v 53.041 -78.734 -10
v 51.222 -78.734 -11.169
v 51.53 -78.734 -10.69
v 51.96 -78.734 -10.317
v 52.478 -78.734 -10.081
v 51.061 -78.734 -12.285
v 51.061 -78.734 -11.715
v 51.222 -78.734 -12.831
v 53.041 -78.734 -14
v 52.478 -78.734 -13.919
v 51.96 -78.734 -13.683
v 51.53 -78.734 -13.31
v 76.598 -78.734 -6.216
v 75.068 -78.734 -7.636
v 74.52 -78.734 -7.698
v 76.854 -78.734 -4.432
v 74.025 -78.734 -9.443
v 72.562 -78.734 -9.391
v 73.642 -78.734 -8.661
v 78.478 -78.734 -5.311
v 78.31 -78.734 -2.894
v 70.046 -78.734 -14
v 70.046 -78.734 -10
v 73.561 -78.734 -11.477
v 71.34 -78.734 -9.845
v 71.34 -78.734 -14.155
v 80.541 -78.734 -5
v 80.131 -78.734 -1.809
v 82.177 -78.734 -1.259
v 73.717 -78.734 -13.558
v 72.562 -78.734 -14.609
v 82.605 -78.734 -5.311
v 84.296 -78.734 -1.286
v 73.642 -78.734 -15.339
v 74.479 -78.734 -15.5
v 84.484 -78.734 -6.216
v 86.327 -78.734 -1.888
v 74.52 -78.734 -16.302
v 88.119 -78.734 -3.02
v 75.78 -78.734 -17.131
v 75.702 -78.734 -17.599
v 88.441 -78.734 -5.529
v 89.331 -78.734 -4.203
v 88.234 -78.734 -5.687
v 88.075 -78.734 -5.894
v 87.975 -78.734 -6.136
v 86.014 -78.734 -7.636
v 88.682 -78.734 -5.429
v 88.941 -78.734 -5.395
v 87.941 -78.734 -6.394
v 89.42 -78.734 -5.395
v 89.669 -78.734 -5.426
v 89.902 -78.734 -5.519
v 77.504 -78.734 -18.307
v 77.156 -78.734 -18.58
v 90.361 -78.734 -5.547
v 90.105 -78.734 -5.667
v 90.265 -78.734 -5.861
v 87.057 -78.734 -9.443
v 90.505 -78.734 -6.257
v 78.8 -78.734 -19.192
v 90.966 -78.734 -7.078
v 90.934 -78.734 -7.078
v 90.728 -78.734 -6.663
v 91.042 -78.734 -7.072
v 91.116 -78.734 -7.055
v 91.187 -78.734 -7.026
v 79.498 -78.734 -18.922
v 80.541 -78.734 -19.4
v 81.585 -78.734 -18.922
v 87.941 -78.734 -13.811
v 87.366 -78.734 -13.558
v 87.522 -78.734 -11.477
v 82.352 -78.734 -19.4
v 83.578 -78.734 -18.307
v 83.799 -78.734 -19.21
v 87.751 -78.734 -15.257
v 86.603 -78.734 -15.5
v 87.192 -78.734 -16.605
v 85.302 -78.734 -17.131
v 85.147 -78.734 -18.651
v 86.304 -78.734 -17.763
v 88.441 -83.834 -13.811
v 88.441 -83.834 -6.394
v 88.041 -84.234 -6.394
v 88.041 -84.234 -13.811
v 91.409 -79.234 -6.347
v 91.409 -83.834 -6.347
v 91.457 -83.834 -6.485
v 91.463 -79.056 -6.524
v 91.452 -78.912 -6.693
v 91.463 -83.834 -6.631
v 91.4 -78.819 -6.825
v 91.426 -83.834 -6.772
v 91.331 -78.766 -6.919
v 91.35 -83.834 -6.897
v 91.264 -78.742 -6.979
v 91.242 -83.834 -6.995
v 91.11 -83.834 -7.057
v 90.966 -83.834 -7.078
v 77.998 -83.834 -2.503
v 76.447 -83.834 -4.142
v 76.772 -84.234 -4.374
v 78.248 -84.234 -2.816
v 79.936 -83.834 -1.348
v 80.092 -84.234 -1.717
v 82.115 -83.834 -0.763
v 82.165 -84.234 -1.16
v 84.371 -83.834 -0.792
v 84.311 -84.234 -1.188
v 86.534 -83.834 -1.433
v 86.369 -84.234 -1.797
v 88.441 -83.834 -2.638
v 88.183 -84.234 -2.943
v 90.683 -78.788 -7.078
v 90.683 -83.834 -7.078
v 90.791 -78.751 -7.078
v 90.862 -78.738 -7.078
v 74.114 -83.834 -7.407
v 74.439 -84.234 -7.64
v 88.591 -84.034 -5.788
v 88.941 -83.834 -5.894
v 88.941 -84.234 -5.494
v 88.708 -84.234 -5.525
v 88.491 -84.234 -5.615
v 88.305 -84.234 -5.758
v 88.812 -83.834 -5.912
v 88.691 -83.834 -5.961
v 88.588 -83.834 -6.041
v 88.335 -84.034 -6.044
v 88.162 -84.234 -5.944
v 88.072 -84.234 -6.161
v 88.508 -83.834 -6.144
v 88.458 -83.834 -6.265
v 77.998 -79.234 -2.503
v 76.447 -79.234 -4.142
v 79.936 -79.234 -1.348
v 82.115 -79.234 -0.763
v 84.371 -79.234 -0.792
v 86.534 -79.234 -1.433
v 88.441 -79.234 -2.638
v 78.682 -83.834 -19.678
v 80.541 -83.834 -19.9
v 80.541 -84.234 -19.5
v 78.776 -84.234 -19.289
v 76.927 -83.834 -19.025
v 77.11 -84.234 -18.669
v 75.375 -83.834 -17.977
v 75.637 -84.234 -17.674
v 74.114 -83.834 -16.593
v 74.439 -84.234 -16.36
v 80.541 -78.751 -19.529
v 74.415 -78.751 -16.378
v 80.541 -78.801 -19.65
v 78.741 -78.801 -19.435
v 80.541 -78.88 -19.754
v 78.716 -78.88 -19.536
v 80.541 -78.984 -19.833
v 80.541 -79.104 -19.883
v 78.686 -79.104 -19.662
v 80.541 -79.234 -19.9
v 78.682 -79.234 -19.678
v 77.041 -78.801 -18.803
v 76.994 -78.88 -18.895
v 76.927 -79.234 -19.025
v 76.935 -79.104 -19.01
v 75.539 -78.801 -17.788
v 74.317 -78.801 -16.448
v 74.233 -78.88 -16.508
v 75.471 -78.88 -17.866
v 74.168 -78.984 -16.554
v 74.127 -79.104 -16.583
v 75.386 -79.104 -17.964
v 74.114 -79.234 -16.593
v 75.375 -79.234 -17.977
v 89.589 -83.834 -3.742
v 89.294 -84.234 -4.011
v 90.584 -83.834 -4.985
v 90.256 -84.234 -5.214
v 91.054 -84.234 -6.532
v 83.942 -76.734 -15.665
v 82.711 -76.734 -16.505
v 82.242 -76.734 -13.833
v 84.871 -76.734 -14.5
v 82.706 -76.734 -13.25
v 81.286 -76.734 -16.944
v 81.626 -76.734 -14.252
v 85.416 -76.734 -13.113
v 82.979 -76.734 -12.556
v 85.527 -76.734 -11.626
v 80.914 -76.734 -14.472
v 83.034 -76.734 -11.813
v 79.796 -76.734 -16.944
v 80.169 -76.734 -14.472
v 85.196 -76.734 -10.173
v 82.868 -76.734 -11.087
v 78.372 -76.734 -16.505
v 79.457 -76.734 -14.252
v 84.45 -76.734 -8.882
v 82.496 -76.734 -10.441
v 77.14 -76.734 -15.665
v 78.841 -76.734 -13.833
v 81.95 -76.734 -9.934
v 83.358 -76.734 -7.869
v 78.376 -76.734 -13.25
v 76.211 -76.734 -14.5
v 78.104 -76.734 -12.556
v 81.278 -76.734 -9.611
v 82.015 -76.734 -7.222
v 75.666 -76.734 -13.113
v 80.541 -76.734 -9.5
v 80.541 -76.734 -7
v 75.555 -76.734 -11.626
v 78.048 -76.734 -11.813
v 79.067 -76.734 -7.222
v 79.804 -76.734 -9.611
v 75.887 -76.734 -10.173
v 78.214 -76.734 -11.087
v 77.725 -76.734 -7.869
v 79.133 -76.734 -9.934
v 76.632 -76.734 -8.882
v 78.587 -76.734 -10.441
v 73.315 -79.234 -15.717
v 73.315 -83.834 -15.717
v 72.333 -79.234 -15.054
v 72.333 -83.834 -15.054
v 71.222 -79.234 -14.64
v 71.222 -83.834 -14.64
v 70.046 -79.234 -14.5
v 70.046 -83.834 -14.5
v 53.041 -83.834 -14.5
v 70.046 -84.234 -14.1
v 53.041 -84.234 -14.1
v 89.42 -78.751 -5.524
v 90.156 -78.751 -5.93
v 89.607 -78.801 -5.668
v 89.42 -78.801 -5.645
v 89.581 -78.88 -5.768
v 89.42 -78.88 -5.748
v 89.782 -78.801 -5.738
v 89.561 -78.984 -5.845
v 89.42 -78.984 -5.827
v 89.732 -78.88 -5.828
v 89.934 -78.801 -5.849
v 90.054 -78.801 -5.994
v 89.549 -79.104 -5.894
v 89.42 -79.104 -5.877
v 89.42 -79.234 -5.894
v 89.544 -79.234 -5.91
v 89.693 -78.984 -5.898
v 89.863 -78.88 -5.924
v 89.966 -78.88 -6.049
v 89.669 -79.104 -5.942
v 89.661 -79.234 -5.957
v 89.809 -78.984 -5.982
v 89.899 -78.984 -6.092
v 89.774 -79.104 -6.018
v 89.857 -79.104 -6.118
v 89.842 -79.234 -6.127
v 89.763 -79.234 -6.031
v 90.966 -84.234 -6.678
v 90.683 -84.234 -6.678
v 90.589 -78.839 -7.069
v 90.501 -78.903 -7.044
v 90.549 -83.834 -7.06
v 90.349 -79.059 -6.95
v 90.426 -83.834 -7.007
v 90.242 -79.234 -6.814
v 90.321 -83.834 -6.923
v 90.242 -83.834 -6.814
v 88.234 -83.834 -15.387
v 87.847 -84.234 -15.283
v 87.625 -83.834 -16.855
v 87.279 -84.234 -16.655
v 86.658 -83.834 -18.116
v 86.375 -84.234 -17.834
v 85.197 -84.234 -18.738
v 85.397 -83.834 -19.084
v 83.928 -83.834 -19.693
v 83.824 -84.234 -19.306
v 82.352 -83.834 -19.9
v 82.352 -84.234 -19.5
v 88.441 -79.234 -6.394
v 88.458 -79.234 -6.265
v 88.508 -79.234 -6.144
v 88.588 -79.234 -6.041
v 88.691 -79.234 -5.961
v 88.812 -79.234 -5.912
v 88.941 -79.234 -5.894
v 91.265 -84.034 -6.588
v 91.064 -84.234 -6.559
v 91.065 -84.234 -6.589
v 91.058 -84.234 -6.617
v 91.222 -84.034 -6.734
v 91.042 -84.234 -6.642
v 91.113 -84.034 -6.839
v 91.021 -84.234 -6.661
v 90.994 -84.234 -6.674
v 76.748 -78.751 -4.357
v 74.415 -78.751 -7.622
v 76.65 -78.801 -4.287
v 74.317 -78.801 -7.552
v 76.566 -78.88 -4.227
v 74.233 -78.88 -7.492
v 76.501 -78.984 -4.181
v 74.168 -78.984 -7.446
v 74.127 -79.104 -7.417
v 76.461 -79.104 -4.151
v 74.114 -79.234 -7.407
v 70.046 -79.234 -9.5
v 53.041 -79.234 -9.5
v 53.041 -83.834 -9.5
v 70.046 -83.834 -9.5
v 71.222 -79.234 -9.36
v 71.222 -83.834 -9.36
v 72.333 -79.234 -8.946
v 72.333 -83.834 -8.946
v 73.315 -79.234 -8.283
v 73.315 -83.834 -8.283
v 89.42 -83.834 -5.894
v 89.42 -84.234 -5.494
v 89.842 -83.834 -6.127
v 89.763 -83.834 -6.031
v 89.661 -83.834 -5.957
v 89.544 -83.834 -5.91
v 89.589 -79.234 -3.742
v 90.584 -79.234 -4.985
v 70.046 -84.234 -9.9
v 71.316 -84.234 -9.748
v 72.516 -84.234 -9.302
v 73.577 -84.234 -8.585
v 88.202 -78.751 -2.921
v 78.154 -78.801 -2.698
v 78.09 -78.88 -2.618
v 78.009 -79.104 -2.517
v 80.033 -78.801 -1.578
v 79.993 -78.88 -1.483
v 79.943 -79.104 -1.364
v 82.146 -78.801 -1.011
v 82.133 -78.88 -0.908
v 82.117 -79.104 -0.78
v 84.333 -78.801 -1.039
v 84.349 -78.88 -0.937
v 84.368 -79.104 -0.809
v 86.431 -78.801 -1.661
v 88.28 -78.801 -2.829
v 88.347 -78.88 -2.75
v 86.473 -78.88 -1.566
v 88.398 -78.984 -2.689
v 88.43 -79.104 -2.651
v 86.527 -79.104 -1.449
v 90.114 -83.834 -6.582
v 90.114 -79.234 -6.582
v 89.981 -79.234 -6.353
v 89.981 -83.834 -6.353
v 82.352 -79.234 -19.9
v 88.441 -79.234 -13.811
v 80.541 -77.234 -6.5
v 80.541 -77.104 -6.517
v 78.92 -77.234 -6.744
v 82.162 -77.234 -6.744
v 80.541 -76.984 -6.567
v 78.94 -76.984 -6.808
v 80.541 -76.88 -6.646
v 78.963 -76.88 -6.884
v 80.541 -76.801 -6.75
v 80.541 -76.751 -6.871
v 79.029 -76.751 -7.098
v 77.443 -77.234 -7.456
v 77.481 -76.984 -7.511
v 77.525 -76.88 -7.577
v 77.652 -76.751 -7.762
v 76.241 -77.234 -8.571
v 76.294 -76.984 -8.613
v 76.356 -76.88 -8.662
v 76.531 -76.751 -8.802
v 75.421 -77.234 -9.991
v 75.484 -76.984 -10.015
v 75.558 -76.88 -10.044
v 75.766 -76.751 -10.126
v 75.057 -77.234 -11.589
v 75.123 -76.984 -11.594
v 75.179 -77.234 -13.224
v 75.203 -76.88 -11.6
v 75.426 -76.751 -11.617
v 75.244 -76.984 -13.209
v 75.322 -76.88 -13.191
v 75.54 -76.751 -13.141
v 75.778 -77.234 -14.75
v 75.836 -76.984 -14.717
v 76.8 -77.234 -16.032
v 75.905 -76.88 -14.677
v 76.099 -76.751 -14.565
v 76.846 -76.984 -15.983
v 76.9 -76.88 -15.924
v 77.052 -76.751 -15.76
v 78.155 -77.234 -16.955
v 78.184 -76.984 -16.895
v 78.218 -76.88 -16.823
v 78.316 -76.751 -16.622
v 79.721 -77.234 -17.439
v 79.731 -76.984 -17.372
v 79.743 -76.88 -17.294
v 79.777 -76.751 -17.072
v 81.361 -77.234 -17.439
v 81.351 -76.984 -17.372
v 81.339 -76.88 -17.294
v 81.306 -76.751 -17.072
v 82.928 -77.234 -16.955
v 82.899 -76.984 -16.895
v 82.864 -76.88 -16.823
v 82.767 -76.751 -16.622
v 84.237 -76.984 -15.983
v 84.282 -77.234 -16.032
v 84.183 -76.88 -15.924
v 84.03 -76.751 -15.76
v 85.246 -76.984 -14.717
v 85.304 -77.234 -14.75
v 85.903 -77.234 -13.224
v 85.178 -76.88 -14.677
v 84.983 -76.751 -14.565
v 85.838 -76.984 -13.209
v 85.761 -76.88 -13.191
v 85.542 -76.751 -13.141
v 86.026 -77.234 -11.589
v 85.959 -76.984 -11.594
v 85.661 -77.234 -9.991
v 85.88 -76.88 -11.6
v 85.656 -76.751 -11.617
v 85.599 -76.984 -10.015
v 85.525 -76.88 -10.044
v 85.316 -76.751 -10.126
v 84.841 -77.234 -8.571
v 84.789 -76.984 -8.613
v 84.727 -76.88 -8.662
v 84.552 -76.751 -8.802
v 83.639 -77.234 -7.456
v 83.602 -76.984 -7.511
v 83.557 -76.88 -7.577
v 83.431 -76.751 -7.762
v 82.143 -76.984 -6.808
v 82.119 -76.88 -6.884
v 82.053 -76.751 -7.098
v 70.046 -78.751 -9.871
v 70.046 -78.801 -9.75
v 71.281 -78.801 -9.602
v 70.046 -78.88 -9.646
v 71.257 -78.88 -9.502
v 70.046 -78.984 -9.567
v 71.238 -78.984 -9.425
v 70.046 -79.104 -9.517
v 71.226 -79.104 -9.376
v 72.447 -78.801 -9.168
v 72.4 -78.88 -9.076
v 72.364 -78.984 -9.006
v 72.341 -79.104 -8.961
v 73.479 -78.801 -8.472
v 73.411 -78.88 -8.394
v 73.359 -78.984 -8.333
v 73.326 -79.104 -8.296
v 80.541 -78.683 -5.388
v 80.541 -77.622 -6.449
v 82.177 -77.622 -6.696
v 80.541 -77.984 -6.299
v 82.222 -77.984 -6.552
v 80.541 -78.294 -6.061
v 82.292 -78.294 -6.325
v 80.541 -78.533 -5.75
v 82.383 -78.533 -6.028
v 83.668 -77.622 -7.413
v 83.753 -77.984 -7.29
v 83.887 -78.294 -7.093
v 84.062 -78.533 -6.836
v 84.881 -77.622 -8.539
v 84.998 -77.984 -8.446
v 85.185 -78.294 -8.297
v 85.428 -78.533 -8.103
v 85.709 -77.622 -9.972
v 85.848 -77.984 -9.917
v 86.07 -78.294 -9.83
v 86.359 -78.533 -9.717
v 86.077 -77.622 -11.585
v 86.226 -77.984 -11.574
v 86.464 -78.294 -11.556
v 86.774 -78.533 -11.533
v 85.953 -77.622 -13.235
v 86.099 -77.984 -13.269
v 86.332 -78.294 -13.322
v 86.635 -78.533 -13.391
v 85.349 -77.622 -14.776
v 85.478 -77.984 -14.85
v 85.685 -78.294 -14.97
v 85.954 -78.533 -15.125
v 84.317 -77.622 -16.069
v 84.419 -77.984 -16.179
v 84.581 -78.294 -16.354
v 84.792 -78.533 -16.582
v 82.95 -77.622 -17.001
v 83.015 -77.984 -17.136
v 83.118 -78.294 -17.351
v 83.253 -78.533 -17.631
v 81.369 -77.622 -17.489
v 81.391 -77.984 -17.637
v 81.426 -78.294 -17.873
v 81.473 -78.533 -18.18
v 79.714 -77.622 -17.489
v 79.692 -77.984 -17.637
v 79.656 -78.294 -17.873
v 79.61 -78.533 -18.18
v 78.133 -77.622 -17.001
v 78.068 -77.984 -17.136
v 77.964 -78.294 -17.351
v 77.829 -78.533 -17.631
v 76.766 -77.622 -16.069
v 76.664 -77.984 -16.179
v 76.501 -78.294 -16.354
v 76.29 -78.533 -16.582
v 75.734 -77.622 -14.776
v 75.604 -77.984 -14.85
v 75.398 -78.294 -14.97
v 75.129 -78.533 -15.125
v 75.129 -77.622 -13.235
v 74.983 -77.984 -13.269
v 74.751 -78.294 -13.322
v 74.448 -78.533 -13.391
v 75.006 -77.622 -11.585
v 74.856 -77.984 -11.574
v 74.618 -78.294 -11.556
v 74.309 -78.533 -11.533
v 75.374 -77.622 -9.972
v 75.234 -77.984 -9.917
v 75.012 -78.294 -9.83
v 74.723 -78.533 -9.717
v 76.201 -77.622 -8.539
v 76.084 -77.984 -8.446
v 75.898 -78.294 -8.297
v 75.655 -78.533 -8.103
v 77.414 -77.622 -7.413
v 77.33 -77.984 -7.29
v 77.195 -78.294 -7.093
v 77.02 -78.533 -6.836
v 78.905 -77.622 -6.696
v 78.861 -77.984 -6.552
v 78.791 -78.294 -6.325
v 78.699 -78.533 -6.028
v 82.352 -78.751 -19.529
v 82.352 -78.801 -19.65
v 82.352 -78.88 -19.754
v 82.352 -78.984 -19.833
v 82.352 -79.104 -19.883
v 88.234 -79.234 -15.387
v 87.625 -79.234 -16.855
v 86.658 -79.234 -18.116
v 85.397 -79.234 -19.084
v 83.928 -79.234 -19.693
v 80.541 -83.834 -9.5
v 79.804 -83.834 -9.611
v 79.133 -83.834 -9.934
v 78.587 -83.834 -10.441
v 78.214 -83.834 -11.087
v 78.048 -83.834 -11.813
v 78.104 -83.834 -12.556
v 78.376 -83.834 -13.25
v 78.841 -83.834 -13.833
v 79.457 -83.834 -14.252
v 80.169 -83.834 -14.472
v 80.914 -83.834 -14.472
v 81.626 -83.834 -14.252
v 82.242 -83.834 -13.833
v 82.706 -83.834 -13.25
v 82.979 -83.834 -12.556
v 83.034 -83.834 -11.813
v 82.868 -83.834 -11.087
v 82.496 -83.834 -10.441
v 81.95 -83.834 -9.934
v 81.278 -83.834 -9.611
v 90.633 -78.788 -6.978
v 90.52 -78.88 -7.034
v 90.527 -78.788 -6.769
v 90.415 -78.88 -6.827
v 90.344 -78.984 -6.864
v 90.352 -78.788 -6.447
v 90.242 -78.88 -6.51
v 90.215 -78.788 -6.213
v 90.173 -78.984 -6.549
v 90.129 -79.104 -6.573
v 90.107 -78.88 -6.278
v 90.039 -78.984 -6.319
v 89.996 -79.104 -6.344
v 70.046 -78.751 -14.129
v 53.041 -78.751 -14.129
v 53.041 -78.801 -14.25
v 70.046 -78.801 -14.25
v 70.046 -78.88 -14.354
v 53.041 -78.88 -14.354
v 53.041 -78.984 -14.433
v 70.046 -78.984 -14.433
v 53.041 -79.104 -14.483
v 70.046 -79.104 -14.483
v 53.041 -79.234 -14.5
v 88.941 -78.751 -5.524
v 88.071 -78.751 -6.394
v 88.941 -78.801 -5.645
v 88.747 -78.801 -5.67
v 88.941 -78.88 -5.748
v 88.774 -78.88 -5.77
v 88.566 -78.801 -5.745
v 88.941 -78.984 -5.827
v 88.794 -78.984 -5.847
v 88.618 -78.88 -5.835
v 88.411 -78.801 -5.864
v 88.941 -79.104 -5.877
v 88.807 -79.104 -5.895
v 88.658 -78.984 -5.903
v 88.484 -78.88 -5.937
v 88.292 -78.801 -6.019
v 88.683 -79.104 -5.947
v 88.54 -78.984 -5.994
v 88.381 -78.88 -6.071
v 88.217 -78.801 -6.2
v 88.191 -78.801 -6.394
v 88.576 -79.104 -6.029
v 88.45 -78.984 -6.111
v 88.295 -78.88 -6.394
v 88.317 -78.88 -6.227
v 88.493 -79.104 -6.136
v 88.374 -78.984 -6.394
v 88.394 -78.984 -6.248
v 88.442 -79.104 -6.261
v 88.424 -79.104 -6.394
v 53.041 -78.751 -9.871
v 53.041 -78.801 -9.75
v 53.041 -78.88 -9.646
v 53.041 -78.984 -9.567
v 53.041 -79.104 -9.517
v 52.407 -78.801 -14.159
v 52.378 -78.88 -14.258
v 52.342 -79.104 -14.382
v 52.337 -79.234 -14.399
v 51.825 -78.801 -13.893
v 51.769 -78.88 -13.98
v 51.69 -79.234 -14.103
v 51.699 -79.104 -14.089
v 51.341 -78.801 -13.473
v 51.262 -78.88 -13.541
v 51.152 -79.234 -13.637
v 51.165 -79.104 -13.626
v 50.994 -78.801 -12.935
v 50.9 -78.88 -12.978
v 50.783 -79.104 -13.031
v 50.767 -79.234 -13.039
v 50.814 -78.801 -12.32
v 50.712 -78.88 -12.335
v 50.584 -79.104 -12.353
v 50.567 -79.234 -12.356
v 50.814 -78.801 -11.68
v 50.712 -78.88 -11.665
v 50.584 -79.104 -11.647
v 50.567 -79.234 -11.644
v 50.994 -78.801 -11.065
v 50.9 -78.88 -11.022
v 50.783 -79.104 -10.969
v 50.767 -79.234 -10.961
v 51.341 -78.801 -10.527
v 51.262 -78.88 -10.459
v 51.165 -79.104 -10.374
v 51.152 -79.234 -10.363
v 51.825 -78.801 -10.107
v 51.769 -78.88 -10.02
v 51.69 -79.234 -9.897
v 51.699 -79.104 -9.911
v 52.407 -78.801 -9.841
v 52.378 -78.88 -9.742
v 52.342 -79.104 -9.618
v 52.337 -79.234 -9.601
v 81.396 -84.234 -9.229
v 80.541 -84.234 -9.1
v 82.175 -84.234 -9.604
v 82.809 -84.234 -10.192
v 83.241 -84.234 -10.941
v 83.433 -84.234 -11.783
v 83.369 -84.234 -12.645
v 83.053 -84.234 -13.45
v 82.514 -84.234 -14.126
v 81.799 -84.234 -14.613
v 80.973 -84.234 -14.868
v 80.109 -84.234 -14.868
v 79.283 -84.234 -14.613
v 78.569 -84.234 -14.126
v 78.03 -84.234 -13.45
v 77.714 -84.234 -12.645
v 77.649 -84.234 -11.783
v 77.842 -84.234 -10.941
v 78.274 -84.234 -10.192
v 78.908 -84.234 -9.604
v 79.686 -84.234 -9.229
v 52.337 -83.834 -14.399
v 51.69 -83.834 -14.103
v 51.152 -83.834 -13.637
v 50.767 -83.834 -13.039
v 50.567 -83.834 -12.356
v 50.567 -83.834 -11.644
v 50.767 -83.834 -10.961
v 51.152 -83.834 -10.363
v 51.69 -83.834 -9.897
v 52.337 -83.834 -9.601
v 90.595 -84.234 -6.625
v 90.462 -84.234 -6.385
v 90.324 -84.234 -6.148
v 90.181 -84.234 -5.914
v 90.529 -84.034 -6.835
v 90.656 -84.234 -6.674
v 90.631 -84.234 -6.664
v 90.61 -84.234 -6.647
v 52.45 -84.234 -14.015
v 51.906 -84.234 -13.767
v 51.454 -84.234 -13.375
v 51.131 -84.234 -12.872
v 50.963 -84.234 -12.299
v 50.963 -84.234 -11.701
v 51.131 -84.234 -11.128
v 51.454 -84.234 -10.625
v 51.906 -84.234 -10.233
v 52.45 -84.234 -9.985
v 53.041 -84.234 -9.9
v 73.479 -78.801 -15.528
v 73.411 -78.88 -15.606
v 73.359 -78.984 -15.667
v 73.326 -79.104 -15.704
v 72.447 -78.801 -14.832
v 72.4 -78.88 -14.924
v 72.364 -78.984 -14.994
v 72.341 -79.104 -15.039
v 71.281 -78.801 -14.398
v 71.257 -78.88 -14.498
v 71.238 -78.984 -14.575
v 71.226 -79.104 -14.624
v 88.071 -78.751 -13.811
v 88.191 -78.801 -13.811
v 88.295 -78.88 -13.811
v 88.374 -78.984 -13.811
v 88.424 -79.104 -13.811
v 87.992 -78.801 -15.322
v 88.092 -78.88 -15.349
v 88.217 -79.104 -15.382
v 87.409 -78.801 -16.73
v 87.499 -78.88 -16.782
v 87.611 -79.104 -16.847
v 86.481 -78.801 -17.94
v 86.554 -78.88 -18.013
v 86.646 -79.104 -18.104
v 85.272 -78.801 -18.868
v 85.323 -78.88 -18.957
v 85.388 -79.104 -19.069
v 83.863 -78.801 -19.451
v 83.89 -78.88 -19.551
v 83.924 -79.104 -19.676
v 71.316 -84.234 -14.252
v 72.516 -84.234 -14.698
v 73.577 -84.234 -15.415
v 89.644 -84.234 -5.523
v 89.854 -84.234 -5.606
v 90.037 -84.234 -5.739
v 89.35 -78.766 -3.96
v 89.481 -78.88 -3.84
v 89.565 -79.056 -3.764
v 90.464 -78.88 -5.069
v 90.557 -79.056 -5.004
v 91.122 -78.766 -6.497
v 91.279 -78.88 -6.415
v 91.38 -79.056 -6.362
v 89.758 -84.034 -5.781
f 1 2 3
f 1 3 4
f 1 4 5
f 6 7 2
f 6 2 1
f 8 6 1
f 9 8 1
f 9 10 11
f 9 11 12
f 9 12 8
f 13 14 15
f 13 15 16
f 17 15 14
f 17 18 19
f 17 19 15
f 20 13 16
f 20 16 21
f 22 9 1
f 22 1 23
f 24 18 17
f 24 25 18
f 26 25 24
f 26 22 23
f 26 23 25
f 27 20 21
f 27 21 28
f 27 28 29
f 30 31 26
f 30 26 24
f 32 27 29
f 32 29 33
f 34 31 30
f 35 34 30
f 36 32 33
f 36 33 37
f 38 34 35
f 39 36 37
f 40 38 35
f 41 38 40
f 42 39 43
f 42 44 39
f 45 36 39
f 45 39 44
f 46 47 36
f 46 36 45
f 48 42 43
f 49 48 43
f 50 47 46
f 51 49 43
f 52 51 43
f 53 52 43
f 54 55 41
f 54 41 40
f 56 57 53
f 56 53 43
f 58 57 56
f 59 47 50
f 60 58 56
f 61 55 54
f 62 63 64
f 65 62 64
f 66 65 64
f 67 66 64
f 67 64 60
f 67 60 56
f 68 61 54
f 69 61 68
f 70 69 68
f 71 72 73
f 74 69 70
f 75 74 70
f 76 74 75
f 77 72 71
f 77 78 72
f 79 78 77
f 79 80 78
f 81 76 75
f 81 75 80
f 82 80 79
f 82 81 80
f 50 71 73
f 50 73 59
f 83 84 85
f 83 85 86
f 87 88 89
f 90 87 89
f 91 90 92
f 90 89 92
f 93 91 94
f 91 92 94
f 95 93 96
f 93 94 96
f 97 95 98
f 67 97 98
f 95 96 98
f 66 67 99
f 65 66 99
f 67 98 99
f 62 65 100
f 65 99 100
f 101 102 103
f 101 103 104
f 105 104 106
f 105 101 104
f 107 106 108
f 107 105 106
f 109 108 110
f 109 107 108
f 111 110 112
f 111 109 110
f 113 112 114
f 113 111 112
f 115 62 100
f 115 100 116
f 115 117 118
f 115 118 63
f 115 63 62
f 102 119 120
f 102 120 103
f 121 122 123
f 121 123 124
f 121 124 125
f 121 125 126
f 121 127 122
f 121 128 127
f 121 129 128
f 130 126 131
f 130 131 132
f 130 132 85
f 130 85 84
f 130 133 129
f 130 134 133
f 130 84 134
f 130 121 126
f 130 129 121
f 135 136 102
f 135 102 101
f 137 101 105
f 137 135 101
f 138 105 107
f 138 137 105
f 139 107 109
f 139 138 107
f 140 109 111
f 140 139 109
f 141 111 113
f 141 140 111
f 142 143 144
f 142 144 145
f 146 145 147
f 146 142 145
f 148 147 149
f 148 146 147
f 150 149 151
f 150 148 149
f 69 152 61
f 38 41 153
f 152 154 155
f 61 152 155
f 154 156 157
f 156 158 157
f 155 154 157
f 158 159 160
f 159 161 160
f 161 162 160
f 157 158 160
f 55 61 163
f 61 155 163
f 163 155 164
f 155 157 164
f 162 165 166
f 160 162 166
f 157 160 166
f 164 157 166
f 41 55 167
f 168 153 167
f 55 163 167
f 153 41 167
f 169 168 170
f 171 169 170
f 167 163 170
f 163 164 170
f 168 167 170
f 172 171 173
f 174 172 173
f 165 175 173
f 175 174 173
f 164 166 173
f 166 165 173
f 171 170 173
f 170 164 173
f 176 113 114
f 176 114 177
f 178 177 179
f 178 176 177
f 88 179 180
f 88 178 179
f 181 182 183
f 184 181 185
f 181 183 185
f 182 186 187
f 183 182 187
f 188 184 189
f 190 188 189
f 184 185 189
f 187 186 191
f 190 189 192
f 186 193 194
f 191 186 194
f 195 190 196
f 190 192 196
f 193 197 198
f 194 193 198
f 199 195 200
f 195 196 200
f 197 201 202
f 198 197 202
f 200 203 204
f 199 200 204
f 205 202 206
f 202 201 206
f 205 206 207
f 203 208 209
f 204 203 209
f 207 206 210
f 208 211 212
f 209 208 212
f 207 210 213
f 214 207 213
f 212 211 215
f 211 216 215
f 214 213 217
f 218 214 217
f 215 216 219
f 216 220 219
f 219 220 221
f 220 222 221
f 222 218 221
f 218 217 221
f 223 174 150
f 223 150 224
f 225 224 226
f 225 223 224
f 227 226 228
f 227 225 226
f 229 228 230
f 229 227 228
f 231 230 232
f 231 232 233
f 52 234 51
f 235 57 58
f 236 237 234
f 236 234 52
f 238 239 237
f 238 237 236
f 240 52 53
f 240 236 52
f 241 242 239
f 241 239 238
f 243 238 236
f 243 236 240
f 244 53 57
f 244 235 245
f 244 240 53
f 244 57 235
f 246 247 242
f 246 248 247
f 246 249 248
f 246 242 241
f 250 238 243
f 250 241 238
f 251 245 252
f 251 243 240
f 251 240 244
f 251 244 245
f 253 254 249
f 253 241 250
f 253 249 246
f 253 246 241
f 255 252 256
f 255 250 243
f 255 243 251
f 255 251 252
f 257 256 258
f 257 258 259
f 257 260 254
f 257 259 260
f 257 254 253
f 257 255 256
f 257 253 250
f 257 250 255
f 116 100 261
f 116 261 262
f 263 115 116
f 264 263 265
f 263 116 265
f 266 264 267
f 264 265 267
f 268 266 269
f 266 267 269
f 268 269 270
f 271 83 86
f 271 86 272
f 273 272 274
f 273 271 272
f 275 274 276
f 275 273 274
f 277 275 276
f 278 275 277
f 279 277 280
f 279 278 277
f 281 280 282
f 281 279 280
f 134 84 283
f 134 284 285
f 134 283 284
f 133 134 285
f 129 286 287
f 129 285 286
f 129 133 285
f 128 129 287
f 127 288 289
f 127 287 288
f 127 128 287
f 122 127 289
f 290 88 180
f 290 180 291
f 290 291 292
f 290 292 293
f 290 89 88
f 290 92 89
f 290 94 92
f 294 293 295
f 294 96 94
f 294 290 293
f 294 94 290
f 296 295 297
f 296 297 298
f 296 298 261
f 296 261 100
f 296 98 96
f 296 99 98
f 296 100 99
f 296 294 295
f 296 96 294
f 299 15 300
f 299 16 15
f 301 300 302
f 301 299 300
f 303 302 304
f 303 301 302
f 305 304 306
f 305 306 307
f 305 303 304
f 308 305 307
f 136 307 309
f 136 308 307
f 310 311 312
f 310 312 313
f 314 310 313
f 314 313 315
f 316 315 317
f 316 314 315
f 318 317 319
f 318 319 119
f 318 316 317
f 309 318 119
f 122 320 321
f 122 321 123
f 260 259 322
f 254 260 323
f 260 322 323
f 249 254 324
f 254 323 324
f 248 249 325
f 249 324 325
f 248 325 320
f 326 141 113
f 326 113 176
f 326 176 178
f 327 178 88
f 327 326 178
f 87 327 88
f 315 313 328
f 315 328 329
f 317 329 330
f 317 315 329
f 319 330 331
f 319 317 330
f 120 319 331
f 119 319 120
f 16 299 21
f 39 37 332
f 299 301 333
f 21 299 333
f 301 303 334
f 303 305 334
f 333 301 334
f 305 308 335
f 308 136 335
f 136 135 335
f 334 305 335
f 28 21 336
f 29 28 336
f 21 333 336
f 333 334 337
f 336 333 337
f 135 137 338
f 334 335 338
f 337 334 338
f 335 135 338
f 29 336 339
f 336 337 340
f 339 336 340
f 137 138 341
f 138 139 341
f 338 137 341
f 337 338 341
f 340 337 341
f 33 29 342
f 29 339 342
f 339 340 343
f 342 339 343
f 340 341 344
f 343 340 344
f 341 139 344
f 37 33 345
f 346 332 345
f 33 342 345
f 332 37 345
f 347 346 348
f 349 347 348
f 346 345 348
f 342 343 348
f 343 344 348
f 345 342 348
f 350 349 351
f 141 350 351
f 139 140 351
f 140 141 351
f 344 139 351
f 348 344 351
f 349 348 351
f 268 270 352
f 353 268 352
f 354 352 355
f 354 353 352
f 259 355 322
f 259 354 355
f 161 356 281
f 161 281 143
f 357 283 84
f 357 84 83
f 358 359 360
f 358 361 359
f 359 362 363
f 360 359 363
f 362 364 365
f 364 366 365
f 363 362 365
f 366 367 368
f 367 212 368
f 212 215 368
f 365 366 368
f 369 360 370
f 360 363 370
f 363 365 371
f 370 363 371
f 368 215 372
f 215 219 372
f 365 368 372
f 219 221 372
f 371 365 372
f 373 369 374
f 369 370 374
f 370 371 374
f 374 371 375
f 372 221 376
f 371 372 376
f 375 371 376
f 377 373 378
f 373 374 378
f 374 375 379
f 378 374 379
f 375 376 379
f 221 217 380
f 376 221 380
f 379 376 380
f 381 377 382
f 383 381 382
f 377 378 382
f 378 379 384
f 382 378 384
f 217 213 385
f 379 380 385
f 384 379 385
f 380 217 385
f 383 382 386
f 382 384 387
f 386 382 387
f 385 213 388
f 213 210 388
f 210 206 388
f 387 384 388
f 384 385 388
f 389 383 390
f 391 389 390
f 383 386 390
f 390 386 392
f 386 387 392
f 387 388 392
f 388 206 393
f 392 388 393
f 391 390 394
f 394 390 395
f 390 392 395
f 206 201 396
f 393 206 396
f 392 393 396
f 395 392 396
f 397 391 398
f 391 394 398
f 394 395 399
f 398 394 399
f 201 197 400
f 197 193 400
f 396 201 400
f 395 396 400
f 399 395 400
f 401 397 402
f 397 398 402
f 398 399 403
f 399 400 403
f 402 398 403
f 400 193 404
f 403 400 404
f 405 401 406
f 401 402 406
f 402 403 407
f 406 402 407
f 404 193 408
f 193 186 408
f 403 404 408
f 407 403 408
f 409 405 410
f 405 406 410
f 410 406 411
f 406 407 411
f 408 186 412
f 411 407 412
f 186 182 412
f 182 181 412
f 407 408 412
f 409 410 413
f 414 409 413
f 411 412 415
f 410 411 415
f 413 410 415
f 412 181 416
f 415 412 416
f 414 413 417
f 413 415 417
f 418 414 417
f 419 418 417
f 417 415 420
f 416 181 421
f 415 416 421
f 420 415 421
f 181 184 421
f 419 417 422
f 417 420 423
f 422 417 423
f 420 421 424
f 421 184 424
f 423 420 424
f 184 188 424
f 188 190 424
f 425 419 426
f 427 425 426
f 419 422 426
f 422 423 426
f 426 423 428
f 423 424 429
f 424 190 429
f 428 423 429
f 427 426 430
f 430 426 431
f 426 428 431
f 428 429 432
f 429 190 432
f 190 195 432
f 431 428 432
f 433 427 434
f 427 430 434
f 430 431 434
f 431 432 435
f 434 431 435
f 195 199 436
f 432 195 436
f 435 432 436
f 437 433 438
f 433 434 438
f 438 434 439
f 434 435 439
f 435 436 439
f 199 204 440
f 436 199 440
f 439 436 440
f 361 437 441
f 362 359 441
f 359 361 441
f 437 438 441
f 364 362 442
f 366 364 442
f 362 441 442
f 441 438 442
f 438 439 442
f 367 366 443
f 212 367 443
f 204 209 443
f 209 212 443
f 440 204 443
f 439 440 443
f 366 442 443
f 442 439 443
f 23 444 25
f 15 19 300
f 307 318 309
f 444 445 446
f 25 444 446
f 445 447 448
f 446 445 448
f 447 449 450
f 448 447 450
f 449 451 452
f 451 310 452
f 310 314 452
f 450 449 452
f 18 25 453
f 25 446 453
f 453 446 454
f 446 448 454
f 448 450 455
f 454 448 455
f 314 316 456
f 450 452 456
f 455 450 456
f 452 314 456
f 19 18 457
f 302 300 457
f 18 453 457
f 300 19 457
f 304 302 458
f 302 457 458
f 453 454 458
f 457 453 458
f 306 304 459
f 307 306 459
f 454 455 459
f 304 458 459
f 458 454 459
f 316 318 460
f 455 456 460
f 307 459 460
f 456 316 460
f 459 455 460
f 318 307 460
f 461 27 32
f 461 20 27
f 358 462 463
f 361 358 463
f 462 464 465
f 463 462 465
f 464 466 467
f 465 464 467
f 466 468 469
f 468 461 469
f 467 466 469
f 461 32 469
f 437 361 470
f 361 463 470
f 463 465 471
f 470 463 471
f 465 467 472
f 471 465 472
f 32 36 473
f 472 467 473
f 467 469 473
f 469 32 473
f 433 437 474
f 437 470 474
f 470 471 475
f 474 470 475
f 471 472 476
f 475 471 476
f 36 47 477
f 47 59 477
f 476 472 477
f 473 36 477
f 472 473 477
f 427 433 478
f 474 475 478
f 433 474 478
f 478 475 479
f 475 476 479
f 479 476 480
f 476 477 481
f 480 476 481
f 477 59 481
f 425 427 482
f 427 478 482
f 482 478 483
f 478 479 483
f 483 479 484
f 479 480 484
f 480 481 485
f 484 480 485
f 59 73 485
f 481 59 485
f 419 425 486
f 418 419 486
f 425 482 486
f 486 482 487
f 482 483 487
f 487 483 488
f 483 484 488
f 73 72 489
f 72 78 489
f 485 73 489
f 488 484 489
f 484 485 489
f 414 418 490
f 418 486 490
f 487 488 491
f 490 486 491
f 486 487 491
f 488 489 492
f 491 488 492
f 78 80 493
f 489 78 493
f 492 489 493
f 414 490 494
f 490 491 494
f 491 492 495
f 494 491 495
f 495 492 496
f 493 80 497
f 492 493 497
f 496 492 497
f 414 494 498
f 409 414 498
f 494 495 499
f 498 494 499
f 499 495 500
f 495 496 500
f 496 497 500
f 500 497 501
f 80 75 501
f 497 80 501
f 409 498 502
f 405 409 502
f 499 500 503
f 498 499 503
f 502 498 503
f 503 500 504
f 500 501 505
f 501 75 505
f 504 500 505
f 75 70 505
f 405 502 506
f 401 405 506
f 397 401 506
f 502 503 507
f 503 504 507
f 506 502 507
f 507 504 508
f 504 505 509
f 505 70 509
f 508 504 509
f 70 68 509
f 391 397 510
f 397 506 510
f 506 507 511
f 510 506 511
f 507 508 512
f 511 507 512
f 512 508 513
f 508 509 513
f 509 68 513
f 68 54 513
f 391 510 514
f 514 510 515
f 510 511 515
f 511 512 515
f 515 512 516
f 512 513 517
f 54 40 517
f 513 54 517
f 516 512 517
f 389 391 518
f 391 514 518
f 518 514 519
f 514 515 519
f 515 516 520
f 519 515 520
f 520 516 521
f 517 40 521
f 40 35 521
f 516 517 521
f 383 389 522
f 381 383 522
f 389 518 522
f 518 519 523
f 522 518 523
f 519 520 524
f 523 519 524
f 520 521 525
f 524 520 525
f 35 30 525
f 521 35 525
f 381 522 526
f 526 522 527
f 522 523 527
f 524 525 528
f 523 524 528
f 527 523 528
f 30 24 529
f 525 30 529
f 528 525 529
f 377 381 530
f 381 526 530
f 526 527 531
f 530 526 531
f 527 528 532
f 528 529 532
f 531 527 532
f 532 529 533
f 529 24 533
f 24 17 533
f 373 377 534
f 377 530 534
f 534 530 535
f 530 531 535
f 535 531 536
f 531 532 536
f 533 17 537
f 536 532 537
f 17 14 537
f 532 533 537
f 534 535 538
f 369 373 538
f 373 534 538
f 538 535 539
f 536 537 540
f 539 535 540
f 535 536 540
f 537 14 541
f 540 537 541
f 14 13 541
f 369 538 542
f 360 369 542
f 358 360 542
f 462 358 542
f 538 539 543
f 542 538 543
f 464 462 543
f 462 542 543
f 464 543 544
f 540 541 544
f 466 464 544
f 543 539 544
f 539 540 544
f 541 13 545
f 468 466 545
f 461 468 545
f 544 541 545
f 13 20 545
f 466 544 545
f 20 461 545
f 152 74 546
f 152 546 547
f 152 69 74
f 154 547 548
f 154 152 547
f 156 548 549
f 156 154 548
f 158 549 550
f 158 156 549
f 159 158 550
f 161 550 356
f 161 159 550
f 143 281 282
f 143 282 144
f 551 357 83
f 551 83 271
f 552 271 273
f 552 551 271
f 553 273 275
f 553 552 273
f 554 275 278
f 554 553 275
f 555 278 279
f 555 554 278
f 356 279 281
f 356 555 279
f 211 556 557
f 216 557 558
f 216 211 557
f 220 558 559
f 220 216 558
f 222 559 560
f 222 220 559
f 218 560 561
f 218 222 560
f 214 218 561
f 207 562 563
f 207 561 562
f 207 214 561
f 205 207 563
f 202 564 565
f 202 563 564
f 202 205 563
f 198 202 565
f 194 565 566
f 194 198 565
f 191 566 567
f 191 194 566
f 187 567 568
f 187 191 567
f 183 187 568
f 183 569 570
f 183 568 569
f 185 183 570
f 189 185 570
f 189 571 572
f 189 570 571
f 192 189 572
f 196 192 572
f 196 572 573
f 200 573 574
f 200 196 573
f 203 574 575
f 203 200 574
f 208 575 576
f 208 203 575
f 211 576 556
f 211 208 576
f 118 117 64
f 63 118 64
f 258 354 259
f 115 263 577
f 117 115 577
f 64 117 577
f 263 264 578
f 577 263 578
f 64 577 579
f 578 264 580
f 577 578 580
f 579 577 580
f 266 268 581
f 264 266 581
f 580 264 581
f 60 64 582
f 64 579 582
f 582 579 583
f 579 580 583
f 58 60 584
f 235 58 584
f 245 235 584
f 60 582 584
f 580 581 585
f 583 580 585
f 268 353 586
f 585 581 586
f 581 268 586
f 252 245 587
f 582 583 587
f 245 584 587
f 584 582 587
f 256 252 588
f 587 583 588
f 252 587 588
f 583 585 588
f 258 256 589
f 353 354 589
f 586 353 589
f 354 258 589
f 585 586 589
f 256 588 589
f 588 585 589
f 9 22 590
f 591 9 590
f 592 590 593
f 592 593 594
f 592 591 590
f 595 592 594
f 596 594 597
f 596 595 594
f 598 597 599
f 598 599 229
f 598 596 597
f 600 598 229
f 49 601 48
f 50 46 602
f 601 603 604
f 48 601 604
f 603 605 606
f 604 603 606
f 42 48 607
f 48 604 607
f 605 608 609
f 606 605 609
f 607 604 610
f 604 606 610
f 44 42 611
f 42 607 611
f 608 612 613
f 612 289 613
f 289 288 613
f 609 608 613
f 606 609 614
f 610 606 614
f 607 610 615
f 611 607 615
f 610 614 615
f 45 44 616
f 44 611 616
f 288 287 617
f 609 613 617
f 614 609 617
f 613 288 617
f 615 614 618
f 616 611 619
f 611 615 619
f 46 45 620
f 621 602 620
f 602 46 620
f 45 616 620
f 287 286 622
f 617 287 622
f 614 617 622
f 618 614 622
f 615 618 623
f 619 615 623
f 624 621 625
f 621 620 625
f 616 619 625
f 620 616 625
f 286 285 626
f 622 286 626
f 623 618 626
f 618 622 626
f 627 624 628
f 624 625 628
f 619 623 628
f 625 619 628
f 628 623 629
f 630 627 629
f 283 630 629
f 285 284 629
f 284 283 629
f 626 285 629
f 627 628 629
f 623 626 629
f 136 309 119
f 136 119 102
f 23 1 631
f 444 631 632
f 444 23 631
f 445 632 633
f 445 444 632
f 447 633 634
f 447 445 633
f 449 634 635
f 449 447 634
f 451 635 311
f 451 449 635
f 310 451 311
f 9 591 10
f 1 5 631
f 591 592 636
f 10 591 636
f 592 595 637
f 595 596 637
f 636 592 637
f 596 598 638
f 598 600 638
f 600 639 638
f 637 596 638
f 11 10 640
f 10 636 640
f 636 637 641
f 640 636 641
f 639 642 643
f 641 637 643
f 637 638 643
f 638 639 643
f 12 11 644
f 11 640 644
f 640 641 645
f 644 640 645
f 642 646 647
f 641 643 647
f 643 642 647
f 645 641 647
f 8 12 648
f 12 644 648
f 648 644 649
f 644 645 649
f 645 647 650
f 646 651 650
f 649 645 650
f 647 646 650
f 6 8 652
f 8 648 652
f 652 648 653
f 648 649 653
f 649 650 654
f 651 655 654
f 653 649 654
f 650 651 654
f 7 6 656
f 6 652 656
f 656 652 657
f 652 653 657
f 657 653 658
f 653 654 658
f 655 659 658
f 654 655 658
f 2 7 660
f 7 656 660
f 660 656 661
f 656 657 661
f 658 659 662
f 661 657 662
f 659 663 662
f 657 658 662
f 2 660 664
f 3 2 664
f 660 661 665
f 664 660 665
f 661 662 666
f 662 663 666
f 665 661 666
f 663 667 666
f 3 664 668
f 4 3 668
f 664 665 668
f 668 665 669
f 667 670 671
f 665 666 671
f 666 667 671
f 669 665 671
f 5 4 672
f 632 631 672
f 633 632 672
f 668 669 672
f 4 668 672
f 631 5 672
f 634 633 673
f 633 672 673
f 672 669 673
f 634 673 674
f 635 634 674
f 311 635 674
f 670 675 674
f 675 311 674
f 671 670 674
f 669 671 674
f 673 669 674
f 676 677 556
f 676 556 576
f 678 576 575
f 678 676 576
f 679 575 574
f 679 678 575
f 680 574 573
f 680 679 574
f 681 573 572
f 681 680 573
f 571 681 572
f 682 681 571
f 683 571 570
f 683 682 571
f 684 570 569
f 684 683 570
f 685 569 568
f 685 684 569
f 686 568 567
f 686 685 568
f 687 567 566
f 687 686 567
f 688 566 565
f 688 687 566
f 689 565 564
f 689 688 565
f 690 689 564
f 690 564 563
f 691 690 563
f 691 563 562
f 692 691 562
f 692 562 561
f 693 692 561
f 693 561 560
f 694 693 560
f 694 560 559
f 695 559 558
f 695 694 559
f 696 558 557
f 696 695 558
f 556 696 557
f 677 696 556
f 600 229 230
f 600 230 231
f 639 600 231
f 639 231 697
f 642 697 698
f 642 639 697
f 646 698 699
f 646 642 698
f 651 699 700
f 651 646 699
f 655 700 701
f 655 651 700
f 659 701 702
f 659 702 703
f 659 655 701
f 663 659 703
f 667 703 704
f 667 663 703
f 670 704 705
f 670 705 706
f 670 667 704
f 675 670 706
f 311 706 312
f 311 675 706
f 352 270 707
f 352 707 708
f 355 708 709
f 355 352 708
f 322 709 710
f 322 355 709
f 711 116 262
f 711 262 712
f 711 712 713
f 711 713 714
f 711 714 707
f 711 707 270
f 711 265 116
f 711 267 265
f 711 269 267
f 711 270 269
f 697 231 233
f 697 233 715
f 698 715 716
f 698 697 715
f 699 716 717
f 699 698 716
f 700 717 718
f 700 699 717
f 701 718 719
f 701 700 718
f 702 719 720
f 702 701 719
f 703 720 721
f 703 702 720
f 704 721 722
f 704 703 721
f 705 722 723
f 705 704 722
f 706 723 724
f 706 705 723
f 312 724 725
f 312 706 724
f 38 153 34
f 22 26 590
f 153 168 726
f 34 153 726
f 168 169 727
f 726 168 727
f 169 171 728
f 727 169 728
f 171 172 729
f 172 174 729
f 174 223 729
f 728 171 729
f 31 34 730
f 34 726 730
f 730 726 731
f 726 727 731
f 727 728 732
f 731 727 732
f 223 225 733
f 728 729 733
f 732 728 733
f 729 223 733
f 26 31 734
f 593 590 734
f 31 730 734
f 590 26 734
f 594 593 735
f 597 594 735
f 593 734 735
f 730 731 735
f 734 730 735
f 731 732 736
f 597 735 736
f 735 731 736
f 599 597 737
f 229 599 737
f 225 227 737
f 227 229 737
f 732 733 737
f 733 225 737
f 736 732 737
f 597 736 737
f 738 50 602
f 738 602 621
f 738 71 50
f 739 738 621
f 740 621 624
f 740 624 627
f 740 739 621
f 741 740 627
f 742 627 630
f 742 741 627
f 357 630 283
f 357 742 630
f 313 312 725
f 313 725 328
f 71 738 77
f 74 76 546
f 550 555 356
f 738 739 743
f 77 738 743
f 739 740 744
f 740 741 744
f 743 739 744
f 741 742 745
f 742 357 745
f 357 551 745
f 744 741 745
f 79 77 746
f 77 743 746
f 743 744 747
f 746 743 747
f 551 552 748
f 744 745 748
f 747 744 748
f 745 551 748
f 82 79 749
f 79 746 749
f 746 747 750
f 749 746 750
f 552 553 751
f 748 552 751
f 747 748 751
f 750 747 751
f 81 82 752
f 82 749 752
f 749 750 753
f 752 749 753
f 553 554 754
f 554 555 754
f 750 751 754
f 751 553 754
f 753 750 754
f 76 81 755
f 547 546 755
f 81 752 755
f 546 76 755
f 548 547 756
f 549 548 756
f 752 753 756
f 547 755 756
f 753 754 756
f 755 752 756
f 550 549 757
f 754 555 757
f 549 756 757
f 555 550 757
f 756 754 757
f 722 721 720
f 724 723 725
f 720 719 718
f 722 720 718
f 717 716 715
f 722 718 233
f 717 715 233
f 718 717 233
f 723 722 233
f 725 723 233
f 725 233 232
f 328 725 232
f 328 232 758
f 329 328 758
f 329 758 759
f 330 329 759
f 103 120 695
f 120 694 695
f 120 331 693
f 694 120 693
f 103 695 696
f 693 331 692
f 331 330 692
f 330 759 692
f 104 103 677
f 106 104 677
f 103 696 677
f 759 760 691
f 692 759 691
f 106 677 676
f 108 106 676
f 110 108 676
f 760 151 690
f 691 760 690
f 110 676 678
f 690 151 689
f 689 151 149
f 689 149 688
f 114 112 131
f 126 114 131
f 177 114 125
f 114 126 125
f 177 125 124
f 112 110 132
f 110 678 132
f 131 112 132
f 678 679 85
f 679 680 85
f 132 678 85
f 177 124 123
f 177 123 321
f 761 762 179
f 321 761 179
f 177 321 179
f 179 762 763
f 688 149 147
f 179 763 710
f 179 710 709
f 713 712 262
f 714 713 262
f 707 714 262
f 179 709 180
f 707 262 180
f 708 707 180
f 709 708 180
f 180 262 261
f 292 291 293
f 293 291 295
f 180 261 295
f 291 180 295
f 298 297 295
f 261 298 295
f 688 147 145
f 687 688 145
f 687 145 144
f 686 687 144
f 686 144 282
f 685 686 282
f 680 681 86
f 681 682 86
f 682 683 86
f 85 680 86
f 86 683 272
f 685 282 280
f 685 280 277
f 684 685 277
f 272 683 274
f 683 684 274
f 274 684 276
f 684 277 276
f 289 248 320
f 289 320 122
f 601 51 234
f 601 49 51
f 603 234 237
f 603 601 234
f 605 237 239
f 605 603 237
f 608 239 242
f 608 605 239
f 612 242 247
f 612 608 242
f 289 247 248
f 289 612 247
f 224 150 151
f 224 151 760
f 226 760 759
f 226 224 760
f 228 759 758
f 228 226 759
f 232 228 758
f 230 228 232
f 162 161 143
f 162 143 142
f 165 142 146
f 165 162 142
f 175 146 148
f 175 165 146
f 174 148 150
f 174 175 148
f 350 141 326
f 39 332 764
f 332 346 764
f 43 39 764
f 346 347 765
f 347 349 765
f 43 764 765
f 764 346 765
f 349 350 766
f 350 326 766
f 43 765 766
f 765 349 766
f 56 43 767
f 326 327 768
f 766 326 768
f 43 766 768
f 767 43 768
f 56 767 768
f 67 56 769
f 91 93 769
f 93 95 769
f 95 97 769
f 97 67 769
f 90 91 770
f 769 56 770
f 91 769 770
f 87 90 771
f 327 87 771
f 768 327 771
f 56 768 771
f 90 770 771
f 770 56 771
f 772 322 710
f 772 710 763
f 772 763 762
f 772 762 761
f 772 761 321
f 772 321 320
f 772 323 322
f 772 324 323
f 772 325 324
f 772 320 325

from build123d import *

# Parameters (mm, degrees)
BOSS_EXTRUDE1_START = -2
SKETCH1_R           = 2.5
BOSS_EXTRUDE1_DEPTH = 5.5
BOSS_EXTRUDE2_REACH = 96.191
SKETCH2_R           = 5.5
SKETCH2_R_2         = 2.5
FILLET1_R           = 1.5
FILLET2_R           = 0.5
CHAMFER1_SIZE       = 0.4


with BuildPart() as part:
    # Sketch1 → Boss-Extrude1 (new body)
    with BuildSketch(Plane(origin=(0, -76.733621845, 0), x_dir=(1, 0, 0), z_dir=(0, 1, 0)).offset(BOSS_EXTRUDE1_START)):
        with BuildLine():
            Line((53.041217068, 9.5), (70.045503657, 9.5))
            ThreePointArc((70.045503657, 9.5), (72.332982212, 8.946059138), (74.11360963, 7.406976744))
            Line((74.11360963, 7.406976744), (76.446988808, 4.141579527))
            ThreePointArc((76.446988808, 4.141579527), (82.114772389, 0.763045112), (88.441217068, 2.637708614))
            ThreePointArc((88.441217068, 2.637708614), (90.354455743, 4.667684765), (91.758842367, 7.07786808))
            Line((91.758842367, 7.07786808), (90.378524492, 7.07786808))
            ThreePointArc((90.378524492, 7.07786808), (90.053291089, 6.475468544), (89.691215146, 5.89446684))
            Line((89.691215146, 5.89446684), (88.441217068, 5.89446684))
            Line((88.441217068, 5.89446684), (88.441217068, 12))
            Line((88.441217068, 12), (88.441217068, 13.810660172))
            ThreePointArc((88.441217068, 13.810660172), (86.657690725, 18.116473657), (82.35187724, 19.9))
            Line((82.35187724, 19.9), (80.541217068, 19.9))
            ThreePointArc((80.541217068, 19.9), (76.927000951, 19.024773438), (74.11360963, 16.593023256))
            ThreePointArc((74.11360963, 16.593023256), (72.332982212, 15.053940862), (70.045503657, 14.5))
            Line((70.045503657, 14.5), (53.041217068, 14.5))
            ThreePointArc((53.041217068, 14.5), (50.541217068, 12), (53.041217068, 9.5))
        make_face()
        with Locations(Location((80.541217068, 12, 0), (0, 0, 270))):
            Circle(SKETCH1_R, mode=Mode.SUBTRACT)
    extrude(amount=-BOSS_EXTRUDE1_DEPTH)

    # Sketch2 → Boss-Extrude2 (add, up to next)
    with BuildSketch(Plane(origin=(0, -76.733621845, 0), x_dir=(-1, 0, 0), z_dir=(0, -1, 0)), mode=Mode.PRIVATE) as boss_extrude2_sk1:
        with Locations(Location((-80.541217068, 12, 0), (0, 0, 270))):
            Circle(SKETCH2_R)
        with Locations(Location((-80.541217068, 12, 0), (0, 0, 270))):
            Circle(SKETCH2_R_2, mode=Mode.SUBTRACT)
    boss_extrude2_tool1 = extrude(boss_extrude2_sk1.sketch, amount=BOSS_EXTRUDE2_REACH, mode=Mode.PRIVATE) - part.part
    add(boss_extrude2_tool1.solids().sort_by_distance((80.541217, -76.733622, -17.344437))[0])

    # Fillet1
    fillet1_edges = [part.edges().sort_by_distance(p)[0] for p in [
        (80.541217068, -78.733621845, -17.5),
    ]]
    fillet(fillet1_edges, radius=FILLET1_R)

    # Fillet2
    fillet2_edges = [part.edges().sort_by_distance(p)[0] for p in [
        (89.066216107, -78.733621845, -5.89446684),
        (90.053291089, -78.733621845, -6.475468544),
        (90.354455743, -78.733621845, -4.667684765),
        (82.114772389, -78.733621845, -0.763045112),
        (75.280299219, -78.733621845, -5.774278136),
        (72.332982212, -78.733621845, -8.946059138),
        (61.543360362, -78.733621845, -9.5),
        (50.541217068, -78.733621845, -12),
        (61.543360362, -78.733621845, -14.5),
        (72.332982212, -78.733621845, -15.053940862),
        (76.927000951, -78.733621845, -19.024773438),
        (81.446547154, -78.733621845, -19.9),
        (86.657690725, -78.733621845, -18.116473657),
        (88.441217068, -78.733621845, -9.852563506),
        (88.441217068, -81.483621845, -5.89446684),
        (89.691215146, -81.483621845, -5.89446684),
        (90.378524492, -81.483621845, -7.07786808),
        (91.758842367, -81.483621845, -7.07786808),
        (80.541217068, -76.733621845, -17.5),
    ]]
    fillet(fillet2_edges, radius=FILLET2_R - 0.0001)  # a hair under: the kernel refuses the full size

    # Chamfer1
    chamfer1_edges = [part.edges().sort_by_distance(p)[0] for p in [
        (86.657690725, -84.233621845, -18.116473657),
        (81.446547154, -84.233621845, -19.9),
        (76.927000951, -84.233621845, -19.024773438),
        (72.332982212, -84.233621845, -15.053940862),
        (61.543360362, -84.233621845, -14.5),
        (50.541217068, -84.233621845, -12),
        (61.543360362, -84.233621845, -9.5),
        (80.541217068, -84.233621845, -14.5),
        (72.332982212, -84.233621845, -8.946059138),
        (75.280299219, -84.233621845, -5.774278136),
        (82.114772389, -84.233621845, -0.763045112),
        (90.106673865, -84.233621845, -4.347253026),
        (90.0483511, -84.233621845, -6.46697167),
        (90.824107859, -84.233621845, -7.07786808),
        (89.180451269, -84.233621845, -5.89446684),
        (88.441217068, -84.233621845, -10.102513506),
        (90.425701502, -84.233621845, -7.006759492),
        (91.39286189, -84.233621845, -6.837375819),
        (89.661122586, -84.233621845, -5.95658104),
        (88.587634388, -84.233621845, -6.04088416),
    ]]
    chamfer(chamfer1_edges, length=CHAMFER1_SIZE)


solid = part.part
